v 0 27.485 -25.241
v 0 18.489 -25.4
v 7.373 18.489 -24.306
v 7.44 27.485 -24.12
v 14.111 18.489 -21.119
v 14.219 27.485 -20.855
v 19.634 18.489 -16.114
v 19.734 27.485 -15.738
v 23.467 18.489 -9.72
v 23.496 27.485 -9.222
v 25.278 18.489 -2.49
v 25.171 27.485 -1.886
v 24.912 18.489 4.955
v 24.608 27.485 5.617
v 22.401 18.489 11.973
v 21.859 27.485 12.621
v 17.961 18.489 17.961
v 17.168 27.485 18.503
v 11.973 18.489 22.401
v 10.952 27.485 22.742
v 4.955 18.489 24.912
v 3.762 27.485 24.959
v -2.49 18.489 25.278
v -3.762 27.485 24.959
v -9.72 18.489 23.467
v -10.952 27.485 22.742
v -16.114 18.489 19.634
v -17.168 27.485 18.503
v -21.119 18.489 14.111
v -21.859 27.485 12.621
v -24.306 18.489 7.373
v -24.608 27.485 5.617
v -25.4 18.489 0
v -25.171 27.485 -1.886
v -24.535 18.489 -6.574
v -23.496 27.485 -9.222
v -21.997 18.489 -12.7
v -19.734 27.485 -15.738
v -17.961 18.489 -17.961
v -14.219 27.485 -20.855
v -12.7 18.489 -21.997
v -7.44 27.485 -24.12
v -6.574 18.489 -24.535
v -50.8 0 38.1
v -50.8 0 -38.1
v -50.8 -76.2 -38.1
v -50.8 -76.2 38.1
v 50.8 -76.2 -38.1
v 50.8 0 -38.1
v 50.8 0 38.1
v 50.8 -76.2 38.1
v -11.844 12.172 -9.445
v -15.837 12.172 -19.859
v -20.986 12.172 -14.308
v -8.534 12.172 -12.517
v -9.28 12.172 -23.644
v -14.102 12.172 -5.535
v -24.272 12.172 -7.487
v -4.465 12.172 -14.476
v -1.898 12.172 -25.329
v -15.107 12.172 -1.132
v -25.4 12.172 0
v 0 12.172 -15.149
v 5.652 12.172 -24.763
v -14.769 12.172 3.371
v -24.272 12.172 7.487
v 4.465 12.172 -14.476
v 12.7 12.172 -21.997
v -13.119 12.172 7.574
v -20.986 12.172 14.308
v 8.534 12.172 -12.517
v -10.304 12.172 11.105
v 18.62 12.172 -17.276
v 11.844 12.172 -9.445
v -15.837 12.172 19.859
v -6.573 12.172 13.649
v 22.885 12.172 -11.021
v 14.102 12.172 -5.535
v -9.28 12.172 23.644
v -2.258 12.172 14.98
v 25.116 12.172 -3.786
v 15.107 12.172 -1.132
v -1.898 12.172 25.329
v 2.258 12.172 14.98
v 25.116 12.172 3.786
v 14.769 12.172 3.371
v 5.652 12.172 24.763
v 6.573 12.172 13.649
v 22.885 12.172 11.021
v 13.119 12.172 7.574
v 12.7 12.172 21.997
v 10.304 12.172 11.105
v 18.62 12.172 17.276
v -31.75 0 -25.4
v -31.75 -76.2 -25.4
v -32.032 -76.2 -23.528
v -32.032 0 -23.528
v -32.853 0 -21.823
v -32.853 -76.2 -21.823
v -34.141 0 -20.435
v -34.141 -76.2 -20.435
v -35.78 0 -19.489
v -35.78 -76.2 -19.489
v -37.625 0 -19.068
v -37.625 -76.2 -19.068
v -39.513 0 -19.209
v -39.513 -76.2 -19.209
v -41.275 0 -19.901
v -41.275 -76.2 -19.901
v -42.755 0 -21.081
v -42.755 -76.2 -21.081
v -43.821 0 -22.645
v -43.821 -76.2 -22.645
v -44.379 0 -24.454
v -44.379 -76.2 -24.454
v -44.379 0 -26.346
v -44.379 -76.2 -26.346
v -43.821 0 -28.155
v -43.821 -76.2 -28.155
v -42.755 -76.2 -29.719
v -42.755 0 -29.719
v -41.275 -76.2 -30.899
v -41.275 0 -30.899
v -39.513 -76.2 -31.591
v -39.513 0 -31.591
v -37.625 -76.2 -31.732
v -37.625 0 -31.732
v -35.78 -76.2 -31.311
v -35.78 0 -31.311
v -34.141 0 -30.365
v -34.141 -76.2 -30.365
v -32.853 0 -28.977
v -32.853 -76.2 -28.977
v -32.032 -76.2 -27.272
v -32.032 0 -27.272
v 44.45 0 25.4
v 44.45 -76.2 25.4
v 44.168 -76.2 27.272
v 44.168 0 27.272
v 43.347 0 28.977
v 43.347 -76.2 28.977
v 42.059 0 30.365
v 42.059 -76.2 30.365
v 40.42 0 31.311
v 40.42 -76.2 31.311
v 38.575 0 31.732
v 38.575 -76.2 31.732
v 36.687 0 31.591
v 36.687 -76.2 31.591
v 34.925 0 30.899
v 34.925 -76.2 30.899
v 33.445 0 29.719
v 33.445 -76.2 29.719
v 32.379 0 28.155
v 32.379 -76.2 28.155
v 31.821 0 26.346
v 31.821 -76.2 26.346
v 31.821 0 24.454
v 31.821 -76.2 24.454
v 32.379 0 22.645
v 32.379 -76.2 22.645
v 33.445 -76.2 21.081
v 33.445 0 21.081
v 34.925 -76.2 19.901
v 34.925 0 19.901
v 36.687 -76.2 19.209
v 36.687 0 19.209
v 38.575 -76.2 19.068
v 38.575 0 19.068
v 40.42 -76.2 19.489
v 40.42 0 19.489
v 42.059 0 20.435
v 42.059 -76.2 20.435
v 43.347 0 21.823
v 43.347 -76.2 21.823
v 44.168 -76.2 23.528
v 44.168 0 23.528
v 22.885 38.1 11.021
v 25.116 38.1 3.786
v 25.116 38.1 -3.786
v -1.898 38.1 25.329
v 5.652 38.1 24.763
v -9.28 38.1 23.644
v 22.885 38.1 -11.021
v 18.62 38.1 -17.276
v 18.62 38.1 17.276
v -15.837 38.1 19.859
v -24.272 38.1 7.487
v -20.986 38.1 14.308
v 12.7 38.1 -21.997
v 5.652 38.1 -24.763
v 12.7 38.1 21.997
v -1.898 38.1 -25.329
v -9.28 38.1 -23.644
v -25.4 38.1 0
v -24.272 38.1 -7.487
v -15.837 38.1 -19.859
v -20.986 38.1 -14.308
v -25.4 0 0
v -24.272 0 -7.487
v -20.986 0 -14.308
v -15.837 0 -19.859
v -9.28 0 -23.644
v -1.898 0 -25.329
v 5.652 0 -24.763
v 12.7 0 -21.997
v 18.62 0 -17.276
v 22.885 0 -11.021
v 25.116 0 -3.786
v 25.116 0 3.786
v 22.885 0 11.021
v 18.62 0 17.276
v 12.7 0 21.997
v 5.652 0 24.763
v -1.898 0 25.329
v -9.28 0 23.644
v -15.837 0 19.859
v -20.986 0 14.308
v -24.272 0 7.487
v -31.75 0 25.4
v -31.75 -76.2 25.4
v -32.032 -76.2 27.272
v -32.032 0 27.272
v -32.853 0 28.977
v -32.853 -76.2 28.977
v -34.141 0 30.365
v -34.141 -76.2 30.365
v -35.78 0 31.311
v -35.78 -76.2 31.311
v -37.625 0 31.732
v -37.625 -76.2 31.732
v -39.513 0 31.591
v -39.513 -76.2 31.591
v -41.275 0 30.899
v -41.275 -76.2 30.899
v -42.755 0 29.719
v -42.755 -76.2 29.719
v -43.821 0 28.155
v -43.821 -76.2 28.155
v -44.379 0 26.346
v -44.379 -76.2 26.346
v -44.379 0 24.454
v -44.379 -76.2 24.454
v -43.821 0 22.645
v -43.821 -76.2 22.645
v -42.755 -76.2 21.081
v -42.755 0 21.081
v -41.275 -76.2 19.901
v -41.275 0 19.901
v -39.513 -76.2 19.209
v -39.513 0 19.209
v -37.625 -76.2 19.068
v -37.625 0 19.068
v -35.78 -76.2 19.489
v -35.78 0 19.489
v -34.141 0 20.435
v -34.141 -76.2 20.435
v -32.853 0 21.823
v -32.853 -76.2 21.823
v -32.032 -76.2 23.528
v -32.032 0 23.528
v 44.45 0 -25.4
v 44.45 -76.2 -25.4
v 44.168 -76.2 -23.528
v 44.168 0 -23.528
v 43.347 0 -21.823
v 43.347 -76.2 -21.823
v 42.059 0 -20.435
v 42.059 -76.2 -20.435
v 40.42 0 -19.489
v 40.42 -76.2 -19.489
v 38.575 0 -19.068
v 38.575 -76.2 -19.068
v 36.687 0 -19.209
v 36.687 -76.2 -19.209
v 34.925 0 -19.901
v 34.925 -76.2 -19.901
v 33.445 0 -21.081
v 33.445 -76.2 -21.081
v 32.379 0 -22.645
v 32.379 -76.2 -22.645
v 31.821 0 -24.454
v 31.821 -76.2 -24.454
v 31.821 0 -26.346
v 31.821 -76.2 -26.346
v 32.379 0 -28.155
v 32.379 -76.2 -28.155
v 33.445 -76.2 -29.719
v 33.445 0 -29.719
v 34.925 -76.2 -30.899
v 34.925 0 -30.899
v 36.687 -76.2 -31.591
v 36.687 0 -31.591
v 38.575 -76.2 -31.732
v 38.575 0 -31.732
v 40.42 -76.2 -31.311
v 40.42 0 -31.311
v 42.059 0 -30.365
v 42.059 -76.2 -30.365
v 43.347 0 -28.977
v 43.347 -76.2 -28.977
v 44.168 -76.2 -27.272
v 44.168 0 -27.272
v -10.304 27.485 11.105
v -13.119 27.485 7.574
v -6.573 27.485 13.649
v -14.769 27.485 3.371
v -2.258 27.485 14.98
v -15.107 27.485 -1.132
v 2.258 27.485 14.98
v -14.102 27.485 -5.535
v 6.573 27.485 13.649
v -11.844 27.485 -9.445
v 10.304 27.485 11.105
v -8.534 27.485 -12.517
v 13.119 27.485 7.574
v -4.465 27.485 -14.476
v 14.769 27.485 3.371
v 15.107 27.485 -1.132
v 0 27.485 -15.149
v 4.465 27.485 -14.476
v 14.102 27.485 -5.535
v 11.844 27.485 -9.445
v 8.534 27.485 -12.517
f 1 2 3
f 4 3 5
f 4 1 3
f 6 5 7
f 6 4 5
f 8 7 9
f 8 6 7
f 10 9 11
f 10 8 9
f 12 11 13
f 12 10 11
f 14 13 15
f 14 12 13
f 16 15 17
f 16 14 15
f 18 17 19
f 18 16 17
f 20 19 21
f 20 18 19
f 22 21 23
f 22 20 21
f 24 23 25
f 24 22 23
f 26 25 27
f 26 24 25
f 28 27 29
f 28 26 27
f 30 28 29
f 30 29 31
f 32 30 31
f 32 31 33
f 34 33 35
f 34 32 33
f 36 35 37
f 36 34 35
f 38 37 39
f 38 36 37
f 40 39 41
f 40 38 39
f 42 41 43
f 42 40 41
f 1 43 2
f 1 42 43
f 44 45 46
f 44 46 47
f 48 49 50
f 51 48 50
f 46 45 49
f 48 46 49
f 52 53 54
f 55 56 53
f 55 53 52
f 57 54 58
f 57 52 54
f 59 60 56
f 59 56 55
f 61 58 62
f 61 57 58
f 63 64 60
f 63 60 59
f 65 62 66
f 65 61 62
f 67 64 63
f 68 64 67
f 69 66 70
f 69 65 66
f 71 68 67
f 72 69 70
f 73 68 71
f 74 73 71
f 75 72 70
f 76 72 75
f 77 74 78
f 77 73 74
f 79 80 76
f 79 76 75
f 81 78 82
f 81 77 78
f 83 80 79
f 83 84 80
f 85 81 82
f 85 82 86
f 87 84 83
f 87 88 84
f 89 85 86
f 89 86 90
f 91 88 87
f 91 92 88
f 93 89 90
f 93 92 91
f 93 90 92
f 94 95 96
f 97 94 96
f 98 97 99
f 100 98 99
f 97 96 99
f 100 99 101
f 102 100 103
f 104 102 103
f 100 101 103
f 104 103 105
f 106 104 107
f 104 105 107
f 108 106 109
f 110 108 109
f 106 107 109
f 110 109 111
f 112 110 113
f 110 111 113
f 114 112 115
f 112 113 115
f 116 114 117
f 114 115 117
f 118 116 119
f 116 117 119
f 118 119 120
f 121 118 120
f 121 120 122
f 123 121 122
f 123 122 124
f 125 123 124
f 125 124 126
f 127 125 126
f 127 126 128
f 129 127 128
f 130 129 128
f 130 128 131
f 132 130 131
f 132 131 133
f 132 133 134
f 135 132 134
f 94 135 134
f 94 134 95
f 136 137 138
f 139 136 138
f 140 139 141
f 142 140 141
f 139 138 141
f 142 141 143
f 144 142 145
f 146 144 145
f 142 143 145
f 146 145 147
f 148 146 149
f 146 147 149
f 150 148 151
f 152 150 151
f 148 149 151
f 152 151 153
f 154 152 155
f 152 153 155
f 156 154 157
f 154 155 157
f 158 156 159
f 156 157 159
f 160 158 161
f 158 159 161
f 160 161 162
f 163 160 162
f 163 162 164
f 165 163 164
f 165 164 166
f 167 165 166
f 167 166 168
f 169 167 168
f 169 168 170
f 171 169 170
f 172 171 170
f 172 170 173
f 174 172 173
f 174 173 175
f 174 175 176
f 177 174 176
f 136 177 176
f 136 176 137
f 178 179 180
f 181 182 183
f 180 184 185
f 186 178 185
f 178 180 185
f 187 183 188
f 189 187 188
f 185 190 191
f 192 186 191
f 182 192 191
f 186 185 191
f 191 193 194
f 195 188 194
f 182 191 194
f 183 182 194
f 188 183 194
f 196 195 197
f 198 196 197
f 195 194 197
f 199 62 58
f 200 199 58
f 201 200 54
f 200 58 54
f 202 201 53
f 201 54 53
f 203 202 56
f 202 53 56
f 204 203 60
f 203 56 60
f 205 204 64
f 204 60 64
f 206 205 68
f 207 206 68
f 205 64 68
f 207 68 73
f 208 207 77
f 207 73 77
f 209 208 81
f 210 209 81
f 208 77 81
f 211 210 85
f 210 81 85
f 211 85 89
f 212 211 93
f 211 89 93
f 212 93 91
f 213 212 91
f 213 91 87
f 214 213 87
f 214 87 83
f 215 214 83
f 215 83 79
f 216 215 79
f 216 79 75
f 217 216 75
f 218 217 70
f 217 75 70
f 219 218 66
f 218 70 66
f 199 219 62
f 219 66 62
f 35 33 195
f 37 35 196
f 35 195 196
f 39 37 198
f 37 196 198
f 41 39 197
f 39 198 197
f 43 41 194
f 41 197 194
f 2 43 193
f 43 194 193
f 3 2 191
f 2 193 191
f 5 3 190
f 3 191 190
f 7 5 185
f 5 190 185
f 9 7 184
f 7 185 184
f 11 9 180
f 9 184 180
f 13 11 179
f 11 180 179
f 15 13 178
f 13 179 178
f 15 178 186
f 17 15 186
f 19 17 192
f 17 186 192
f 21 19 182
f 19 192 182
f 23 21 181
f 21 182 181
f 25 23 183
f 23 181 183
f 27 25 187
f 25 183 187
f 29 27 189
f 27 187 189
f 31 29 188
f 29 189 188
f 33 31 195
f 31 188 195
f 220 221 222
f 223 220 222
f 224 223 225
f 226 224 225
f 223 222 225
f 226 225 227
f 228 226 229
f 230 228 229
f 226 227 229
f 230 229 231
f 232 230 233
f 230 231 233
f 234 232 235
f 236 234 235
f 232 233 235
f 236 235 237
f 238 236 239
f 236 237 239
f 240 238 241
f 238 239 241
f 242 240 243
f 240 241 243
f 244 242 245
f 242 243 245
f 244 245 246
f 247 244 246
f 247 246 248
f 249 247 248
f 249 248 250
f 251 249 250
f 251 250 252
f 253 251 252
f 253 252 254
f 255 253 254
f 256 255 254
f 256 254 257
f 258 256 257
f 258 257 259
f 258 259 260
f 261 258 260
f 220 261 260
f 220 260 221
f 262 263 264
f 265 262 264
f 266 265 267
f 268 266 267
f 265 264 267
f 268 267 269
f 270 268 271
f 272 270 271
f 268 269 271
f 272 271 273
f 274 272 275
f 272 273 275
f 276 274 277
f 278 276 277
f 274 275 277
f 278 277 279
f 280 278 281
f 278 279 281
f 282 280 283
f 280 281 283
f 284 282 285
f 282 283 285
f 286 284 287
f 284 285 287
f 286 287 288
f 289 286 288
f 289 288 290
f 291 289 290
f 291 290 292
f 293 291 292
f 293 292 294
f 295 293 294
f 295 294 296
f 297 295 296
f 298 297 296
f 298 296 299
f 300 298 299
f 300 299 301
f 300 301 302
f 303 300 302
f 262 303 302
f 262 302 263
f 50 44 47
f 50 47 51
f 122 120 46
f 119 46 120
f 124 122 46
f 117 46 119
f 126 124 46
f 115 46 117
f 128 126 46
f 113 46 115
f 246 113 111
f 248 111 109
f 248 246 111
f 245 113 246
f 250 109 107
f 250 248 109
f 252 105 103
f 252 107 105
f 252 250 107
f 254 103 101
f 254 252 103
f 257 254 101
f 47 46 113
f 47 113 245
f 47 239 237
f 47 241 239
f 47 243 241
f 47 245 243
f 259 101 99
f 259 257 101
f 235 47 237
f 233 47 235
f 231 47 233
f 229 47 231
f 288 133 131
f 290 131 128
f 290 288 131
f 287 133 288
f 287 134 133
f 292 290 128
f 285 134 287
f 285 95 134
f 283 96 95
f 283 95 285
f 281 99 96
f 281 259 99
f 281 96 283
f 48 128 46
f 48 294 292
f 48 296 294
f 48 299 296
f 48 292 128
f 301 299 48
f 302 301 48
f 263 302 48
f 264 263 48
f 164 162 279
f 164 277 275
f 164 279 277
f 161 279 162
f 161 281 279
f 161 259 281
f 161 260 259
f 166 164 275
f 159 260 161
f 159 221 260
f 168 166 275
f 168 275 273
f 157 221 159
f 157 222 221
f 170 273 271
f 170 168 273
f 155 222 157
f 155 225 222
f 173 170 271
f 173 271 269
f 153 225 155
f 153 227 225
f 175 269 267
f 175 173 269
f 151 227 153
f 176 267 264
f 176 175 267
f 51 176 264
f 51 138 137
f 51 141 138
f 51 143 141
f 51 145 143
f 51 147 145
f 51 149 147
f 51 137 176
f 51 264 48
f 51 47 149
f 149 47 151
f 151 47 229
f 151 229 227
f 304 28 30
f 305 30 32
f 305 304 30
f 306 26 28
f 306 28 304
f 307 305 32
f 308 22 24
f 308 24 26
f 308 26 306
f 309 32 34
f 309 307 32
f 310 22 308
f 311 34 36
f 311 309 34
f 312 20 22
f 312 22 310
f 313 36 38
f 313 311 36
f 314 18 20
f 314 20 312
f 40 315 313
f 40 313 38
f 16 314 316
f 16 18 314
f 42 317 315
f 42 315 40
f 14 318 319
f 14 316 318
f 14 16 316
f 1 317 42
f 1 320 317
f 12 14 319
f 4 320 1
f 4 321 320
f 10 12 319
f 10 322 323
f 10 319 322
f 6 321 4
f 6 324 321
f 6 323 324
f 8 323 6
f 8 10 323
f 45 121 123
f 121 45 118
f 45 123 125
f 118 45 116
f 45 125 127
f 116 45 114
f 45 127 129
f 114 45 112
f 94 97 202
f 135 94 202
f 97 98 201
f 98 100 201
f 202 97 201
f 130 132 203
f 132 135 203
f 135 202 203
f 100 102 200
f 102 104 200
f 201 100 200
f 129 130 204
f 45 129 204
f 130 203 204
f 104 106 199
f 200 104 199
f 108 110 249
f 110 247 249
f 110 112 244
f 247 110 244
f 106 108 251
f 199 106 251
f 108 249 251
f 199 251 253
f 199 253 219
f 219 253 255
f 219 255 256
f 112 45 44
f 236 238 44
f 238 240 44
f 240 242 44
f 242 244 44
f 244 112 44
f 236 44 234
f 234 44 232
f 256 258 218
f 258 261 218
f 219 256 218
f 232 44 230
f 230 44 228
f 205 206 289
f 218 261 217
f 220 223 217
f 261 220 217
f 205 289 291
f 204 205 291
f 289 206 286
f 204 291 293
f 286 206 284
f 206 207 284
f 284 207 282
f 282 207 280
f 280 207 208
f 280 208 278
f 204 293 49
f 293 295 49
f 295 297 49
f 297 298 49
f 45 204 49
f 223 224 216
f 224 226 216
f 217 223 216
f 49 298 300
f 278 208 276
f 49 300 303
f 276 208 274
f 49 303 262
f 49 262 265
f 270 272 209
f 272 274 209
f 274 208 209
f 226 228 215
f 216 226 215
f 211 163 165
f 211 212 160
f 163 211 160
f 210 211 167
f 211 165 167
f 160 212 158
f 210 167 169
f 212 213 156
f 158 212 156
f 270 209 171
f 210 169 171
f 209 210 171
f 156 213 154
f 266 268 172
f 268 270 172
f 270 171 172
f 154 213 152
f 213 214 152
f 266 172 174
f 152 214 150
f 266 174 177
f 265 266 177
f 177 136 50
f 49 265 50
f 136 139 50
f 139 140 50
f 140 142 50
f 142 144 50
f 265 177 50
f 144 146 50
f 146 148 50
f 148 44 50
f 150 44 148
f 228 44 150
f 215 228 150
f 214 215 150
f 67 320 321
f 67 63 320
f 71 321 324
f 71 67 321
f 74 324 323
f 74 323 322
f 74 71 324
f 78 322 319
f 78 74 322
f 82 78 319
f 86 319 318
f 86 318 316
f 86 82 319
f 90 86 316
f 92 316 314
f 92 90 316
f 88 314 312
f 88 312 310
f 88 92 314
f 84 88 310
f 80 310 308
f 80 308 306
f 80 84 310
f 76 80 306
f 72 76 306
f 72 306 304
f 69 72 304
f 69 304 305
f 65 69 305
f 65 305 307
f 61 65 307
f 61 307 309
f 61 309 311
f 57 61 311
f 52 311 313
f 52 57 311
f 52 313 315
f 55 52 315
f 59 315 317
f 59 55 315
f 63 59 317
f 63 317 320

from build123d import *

# Parameters (mm, degrees)
F0_W     = 101.6
F0_H     = 76.2
F1_DEPTH = 76.2
F2_R     = 6.35
F3_DEPTH = 76.201
F4_W     = 25.4
F4_H     = 38.1


with BuildPart() as f1:
    # F0 (on Front) → F1 (new body)
    with BuildSketch(Plane.XZ):
        Rectangle(F0_W, F0_H)
    extrude(amount=F1_DEPTH)

    # F2 (on face) → F3 (cut, through all)
    with BuildSketch(Plane.XZ.offset(76.2)):
        with Locations((-38.1, 25.4)):
            Circle(F2_R)
        with Locations((-38.1, -25.4)):
            Circle(F2_R)
        with Locations((38.1, 25.4)):
            Circle(F2_R)
        with Locations((38.1, -25.4)):
            Circle(F2_R)
    extrude(amount=-F3_DEPTH, mode=Mode.SUBTRACT)

    # F4 (on Top) → F5 (revolve)
    with BuildSketch(Plane.XY):
        with Locations((-12.7, 19.05)):
            Rectangle(F4_W, F4_H)
    revolve(axis=Axis((0, 19.05, 0), (0, -1, 0)))

    # F6 (on Right) → F7 (revolve, cut)
    with BuildSketch(Plane.YZ):
        Polygon((12.171632, -25.511539), (27.484952, -25.241176), (27.484952, -15.148931), (12.171632, -15.148931), align=None)
    revolve(axis=Axis((0, -19.153455, 0), (0, -1, 0)), mode=Mode.SUBTRACT)


solid = f1.part
